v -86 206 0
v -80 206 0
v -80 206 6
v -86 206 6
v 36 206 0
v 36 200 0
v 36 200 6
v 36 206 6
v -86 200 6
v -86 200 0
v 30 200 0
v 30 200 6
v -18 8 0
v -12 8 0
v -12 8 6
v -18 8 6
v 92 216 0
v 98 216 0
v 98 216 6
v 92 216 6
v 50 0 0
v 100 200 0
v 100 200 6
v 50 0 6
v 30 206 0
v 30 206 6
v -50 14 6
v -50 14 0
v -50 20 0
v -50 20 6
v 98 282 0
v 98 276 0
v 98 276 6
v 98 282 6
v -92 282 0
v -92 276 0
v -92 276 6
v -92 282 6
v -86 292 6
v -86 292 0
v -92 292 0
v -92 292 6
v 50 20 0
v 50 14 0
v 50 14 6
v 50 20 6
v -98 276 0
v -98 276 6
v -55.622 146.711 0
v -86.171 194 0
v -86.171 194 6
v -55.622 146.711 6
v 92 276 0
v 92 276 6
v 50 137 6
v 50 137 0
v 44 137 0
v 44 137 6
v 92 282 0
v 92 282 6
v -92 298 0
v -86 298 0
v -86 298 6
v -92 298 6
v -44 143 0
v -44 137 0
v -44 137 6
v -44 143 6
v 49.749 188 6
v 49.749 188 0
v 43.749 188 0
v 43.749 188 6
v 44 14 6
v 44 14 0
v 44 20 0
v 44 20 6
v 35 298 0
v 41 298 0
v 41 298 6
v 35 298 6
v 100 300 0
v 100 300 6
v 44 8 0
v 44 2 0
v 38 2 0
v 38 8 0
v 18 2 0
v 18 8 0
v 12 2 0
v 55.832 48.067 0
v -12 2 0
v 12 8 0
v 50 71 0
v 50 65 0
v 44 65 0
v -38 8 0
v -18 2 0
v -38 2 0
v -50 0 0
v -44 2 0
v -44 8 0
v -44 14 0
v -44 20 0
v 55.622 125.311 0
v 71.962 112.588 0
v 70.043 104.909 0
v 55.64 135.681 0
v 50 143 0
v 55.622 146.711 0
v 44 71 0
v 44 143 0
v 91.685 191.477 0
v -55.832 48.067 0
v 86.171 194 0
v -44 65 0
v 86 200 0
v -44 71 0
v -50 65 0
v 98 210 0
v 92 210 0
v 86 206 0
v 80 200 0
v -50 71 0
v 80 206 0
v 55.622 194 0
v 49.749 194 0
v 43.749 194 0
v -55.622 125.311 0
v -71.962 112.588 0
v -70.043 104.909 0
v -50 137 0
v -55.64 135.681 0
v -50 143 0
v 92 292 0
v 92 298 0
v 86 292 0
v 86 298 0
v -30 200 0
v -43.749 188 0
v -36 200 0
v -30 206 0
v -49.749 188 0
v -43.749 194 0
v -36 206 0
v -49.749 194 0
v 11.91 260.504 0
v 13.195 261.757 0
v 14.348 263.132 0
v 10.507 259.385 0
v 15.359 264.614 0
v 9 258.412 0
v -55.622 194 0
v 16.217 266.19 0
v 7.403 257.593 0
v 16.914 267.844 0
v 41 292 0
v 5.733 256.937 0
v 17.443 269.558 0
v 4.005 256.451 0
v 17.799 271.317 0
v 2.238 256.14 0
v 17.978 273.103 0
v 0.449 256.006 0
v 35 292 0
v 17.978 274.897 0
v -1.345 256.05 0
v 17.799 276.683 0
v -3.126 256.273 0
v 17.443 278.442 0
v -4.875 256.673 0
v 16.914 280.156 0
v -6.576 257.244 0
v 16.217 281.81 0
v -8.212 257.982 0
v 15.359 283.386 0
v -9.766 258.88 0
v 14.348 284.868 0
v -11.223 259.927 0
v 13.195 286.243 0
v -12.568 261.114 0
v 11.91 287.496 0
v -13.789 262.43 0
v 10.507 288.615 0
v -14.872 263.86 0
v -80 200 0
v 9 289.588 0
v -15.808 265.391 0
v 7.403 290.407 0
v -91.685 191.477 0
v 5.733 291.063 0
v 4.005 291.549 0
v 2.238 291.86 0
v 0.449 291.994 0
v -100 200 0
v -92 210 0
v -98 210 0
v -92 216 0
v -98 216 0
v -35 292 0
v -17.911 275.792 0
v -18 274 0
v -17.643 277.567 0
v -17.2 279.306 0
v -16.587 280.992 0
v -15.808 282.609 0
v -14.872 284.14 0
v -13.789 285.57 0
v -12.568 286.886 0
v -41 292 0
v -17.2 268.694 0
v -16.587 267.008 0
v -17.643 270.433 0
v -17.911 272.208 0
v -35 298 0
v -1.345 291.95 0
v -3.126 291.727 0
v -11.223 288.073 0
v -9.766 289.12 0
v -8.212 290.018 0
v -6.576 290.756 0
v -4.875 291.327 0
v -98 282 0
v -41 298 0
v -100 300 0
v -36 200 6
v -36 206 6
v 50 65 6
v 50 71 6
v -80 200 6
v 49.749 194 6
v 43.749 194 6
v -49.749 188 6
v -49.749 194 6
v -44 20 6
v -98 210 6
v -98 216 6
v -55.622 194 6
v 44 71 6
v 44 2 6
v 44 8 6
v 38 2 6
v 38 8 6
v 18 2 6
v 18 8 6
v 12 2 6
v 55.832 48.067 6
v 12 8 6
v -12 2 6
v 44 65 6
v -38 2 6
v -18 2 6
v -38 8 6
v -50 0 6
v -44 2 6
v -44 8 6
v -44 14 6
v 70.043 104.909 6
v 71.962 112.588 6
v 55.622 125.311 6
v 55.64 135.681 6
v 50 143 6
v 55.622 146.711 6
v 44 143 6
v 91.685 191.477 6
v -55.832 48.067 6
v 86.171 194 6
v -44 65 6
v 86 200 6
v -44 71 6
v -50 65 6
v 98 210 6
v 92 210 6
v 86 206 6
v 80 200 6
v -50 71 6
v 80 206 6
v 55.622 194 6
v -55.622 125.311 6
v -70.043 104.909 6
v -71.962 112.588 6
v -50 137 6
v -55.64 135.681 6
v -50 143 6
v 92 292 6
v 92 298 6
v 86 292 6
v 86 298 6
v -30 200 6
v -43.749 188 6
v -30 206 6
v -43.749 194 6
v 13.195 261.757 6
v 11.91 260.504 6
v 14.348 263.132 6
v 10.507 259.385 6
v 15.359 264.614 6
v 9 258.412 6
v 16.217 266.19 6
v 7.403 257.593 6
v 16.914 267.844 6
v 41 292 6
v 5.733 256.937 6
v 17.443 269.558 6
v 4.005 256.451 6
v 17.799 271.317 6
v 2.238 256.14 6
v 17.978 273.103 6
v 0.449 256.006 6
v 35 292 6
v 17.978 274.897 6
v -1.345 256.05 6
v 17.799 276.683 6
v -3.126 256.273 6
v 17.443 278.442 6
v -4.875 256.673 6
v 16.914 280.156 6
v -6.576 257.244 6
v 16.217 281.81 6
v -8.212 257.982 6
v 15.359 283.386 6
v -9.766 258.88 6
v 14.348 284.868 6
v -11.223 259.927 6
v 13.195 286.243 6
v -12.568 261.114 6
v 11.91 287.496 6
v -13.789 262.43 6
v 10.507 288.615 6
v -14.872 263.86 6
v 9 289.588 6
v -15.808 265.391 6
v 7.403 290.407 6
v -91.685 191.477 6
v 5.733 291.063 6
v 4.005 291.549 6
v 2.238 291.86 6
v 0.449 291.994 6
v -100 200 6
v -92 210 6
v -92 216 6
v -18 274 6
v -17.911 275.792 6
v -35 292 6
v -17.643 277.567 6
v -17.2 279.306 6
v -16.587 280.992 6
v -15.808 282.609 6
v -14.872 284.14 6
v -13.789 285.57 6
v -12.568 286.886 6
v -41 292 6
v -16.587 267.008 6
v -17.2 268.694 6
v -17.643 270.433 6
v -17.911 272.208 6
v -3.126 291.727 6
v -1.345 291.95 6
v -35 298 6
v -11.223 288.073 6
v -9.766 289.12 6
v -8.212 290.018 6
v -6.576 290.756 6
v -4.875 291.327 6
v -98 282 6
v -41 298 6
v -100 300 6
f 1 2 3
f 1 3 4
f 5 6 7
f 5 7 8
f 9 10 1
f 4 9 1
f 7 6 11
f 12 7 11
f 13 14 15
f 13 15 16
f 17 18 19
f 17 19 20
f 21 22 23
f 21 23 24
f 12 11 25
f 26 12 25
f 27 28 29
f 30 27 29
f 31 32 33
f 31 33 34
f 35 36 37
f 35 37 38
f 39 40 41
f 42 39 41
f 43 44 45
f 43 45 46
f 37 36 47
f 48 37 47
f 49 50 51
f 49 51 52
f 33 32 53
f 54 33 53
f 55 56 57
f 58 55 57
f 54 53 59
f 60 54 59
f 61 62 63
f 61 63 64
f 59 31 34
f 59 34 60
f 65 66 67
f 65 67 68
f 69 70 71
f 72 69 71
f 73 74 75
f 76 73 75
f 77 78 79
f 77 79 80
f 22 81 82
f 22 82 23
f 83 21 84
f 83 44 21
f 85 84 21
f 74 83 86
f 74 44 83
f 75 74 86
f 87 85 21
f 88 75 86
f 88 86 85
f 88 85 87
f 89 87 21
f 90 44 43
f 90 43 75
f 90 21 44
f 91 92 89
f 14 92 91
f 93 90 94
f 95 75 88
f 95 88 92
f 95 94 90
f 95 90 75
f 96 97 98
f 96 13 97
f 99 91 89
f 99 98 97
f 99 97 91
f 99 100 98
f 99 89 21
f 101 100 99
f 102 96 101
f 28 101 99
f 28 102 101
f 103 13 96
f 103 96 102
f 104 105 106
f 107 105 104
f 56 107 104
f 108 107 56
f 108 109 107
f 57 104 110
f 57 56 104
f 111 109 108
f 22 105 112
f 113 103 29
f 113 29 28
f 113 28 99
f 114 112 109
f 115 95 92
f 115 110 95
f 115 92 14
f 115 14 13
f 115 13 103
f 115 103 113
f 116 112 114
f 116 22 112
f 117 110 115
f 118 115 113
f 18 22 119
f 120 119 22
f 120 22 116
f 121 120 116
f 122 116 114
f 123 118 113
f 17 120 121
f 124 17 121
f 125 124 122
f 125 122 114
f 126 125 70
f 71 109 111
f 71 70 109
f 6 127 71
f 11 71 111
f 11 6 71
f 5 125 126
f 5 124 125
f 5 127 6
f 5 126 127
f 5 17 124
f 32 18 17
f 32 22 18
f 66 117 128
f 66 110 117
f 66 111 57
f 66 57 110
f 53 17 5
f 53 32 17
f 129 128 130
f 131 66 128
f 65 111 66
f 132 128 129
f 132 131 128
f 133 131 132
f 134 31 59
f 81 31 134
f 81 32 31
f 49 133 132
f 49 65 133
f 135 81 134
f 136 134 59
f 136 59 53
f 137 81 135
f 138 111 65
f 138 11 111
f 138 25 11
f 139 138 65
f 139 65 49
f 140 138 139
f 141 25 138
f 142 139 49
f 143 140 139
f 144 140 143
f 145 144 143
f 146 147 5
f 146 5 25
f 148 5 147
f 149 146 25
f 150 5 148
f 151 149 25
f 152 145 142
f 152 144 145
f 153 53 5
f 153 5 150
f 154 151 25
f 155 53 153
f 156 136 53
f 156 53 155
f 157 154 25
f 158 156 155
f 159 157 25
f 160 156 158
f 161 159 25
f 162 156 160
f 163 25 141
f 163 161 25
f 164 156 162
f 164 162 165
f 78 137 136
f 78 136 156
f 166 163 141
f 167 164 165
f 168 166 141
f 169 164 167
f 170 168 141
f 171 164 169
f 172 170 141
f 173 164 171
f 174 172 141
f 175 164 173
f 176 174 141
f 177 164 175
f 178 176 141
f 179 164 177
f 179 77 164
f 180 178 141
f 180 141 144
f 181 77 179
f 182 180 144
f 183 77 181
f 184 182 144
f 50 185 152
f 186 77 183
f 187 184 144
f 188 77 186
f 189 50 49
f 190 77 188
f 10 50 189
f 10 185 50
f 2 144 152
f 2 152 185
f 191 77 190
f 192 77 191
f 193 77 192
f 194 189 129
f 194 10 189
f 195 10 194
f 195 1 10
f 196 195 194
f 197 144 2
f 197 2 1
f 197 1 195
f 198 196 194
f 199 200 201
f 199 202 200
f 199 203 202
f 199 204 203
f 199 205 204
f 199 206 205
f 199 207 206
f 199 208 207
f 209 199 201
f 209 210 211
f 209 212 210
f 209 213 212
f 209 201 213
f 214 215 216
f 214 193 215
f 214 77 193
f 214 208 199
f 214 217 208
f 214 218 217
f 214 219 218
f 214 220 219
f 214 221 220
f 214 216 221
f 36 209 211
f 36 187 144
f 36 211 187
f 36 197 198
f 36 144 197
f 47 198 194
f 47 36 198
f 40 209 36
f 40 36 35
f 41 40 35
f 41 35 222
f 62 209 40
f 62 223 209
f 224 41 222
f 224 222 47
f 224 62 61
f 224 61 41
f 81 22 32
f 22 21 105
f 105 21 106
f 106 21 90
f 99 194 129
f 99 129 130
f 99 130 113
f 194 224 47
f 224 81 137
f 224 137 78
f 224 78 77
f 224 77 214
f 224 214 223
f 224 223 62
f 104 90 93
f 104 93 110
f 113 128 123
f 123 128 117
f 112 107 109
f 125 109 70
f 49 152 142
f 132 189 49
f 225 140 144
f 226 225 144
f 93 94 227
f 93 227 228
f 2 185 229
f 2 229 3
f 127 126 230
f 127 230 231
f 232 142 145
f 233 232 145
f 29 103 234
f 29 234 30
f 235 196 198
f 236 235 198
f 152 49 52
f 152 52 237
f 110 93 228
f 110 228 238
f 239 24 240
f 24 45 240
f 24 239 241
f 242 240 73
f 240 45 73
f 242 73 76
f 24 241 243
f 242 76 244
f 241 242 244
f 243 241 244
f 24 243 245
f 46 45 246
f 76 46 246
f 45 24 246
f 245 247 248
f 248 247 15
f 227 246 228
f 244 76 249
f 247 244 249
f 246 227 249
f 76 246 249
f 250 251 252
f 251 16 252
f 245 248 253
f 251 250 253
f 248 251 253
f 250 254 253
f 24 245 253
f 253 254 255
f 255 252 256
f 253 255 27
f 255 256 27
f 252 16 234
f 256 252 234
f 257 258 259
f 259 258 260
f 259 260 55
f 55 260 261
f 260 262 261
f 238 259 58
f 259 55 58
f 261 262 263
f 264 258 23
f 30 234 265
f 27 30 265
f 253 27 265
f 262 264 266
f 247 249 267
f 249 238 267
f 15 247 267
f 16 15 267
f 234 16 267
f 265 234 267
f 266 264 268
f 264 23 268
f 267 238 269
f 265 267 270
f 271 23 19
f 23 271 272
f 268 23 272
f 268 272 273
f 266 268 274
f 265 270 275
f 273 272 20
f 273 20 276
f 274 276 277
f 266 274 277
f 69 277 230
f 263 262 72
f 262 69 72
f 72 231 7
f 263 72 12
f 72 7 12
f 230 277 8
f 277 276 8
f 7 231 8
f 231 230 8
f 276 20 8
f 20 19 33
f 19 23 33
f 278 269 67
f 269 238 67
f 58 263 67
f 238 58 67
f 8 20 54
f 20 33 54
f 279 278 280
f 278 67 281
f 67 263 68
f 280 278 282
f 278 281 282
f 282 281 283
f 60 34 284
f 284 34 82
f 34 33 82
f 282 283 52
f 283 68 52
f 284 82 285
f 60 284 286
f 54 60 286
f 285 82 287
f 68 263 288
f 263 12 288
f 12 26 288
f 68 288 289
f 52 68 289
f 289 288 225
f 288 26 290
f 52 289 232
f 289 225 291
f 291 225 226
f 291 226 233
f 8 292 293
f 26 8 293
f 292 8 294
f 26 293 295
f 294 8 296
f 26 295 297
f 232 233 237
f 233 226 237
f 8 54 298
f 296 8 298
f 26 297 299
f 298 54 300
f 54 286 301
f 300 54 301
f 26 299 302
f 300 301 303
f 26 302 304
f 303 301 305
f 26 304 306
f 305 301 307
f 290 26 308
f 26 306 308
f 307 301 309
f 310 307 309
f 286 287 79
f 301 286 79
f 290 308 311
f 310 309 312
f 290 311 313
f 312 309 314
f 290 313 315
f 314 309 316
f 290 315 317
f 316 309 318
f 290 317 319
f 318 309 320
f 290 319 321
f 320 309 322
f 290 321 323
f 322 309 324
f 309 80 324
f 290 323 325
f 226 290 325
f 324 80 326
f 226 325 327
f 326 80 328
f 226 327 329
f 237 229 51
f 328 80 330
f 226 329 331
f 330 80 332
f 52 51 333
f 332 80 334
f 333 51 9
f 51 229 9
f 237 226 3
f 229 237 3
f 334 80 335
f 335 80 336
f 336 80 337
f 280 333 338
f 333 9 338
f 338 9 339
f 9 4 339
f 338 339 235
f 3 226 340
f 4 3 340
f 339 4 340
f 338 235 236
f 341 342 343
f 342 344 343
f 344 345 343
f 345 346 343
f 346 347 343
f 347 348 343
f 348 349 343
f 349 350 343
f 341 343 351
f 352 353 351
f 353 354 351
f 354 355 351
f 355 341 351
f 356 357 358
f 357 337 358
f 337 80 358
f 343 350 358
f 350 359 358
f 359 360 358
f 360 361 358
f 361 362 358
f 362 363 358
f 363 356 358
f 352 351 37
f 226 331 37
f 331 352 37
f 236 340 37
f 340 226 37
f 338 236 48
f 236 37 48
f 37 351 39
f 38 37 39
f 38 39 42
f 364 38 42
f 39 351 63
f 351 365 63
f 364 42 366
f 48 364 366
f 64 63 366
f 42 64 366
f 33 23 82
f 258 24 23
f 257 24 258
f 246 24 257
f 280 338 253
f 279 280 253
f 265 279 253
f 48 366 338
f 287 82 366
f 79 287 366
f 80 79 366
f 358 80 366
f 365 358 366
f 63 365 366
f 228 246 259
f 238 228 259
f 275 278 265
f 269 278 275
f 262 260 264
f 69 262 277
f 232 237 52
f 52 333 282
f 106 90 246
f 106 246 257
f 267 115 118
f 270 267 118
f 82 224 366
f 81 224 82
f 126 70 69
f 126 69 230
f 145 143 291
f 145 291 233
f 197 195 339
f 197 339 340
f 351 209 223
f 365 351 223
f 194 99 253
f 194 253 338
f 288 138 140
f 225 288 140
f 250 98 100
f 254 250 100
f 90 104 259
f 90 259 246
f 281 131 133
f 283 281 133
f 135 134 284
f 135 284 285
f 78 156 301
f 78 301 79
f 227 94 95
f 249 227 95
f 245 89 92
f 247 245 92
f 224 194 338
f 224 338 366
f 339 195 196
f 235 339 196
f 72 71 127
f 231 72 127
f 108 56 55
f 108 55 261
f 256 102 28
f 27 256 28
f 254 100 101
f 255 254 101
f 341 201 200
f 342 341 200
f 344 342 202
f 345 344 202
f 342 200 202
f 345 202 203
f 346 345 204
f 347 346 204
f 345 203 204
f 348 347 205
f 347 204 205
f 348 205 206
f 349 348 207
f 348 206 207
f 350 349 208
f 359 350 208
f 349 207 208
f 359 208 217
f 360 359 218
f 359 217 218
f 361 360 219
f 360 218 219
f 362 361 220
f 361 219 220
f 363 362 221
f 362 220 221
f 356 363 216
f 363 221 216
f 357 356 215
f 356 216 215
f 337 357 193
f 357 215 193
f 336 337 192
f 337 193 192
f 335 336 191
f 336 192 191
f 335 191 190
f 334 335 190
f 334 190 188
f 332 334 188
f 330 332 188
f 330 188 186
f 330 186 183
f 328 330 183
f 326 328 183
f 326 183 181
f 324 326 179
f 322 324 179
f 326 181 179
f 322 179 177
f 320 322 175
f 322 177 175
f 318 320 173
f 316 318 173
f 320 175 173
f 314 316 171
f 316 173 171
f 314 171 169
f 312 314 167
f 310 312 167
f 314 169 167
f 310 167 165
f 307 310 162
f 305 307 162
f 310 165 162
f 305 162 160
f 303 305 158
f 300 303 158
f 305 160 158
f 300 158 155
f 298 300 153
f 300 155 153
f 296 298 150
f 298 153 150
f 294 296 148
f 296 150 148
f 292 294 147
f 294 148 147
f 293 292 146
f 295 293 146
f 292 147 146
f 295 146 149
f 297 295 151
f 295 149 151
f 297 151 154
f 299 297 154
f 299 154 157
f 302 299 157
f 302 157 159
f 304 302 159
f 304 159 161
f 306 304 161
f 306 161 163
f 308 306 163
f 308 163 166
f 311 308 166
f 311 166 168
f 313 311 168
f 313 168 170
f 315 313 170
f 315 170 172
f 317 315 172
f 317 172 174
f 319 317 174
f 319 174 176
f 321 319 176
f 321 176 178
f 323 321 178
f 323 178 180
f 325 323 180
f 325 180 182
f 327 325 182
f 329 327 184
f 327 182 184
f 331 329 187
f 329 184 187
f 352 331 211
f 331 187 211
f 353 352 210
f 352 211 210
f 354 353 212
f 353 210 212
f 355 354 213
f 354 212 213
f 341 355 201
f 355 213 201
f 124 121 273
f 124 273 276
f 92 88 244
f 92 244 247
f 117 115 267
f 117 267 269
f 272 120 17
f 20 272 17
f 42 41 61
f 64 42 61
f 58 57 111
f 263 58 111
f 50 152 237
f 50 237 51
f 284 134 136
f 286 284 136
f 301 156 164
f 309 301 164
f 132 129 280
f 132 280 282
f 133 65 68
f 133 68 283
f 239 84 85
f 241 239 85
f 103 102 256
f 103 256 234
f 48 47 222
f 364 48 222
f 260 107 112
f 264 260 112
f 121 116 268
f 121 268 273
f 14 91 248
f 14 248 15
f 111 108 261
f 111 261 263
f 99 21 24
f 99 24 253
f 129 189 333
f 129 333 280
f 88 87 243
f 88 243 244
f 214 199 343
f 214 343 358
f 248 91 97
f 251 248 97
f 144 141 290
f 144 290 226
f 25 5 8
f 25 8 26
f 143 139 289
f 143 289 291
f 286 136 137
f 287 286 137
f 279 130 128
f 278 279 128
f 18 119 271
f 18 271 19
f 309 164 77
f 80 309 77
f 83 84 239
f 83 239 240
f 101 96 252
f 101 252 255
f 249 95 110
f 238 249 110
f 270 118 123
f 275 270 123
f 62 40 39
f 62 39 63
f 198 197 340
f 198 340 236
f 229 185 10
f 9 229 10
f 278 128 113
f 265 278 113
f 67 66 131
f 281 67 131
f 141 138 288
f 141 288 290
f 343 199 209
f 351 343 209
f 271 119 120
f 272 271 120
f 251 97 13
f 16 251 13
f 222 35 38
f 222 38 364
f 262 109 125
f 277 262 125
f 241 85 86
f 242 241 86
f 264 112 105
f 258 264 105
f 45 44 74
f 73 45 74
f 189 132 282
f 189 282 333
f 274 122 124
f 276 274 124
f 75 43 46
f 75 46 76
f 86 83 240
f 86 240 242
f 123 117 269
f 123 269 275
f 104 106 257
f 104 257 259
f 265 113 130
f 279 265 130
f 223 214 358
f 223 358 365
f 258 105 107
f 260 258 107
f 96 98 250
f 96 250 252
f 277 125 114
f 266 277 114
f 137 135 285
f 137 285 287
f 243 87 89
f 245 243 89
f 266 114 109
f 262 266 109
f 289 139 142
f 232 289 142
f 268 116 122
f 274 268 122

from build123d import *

# Parameters (mm, degrees)
BOSS_EXTRUDE1_DEPTH = 6
SKETCH4_W           = 6
SKETCH4_H           = 6
CUT_EXTRUDE2_DEPTH  = 6
SKETCH5_R           = 18
CUT_EXTRUDE3_DEPTH  = 6


with BuildPart() as part:
    # Sketch1 → Boss-Extrude1 (new body)
    with BuildSketch(Plane.XY):
        Polygon((100, 300), (100, 200), (50, 0), (-50, 0), (-100, 200), (-100, 300), align=None)
    extrude(amount=BOSS_EXTRUDE1_DEPTH)

    # Sketch4 → Cut-Extrude2 (cut)
    with BuildSketch(Plane(origin=(0, 0, 0), x_dir=(-1, 0, 0), z_dir=(0, 0, -1))):
        with Locations((-249.21822542, 247.31110849)):
            Rectangle(SKETCH4_W, SKETCH4_H)
        with Locations((-95, 279)):
            Rectangle(SKETCH4_W, SKETCH4_H)
        with Locations((-95, 213)):
            Rectangle(SKETCH4_W, SKETCH4_H)
        with Locations((-89, 295)):
            Rectangle(SKETCH4_W, SKETCH4_H)
        with Locations((-41, 5)):
            Rectangle(SKETCH4_W, SKETCH4_H)
        with Locations((-38, 295)):
            Rectangle(SKETCH4_W, SKETCH4_H)
        with Locations((-83, 203)):
            Rectangle(SKETCH4_W, SKETCH4_H)
        with Locations((-33, 203)):
            Rectangle(SKETCH4_W, SKETCH4_H)
        with Locations((-15, 5)):
            Rectangle(SKETCH4_W, SKETCH4_H)
        with Locations((-47, 17)):
            Rectangle(SKETCH4_W, SKETCH4_H)
        with Locations((-47, 68)):
            Rectangle(SKETCH4_W, SKETCH4_H)
        with Locations((-46.748754565, 191)):
            Rectangle(SKETCH4_W, SKETCH4_H)
        with Locations((-47, 140)):
            Rectangle(SKETCH4_W, SKETCH4_H)
        with Locations((38, 295)):
            Rectangle(SKETCH4_W, SKETCH4_H)
        with Locations((89, 295)):
            Rectangle(SKETCH4_W, SKETCH4_H)
        with Locations((95, 279)):
            Rectangle(SKETCH4_W, SKETCH4_H)
        with Locations((83, 203)):
            Rectangle(SKETCH4_W, SKETCH4_H)
        with Locations((95, 213)):
            Rectangle(SKETCH4_W, SKETCH4_H)
        with Locations((46.748754565, 191)):
            Rectangle(SKETCH4_W, SKETCH4_H)
        with Locations((47, 140)):
            Rectangle(SKETCH4_W, SKETCH4_H)
        with Locations((47, 68)):
            Rectangle(SKETCH4_W, SKETCH4_H)
        with Locations((47, 17)):
            Rectangle(SKETCH4_W, SKETCH4_H)
        with Locations((41, 5)):
            Rectangle(SKETCH4_W, SKETCH4_H)
        with Locations((15, 5)):
            Rectangle(SKETCH4_W, SKETCH4_H)
        with Locations((33, 203)):
            Rectangle(SKETCH4_W, SKETCH4_H)
        Polygon((55.622098795, 194), (86.171284614, 194), (55.622098795, 146.710661579), align=None)
        Polygon((55.640072778, 135.681178614), (91.684652057, 191.47724198), (71.962334114, 112.587970208), align=None)
        Polygon((70.042546798, 104.908820946), (55.622098795, 125.311288729), (55.832173802, 48.067328963), align=None)
        Polygon((-55.832173802, 48.067328963), (-70.042546798, 104.908820946), (-55.622098795, 125.311288729), align=None)
        Polygon((-71.962334114, 112.587970208), (-55.640072778, 135.681178614), (-91.684652057, 191.47724198), align=None)
        Polygon((-86.171284614, 194), (-55.622098795, 146.710661579), (-55.622098795, 194), align=None)
    extrude(amount=-CUT_EXTRUDE2_DEPTH, mode=Mode.SUBTRACT)

    # Sketch5 → Cut-Extrude3 (cut)
    with BuildSketch(Plane(origin=(0, 0, 0), x_dir=(-1, 0, 0), z_dir=(0, 0, -1))):
        with Locations((0, 274)):
            Circle(SKETCH5_R)
    extrude(amount=-CUT_EXTRUDE3_DEPTH, mode=Mode.SUBTRACT)


solid = part.part
